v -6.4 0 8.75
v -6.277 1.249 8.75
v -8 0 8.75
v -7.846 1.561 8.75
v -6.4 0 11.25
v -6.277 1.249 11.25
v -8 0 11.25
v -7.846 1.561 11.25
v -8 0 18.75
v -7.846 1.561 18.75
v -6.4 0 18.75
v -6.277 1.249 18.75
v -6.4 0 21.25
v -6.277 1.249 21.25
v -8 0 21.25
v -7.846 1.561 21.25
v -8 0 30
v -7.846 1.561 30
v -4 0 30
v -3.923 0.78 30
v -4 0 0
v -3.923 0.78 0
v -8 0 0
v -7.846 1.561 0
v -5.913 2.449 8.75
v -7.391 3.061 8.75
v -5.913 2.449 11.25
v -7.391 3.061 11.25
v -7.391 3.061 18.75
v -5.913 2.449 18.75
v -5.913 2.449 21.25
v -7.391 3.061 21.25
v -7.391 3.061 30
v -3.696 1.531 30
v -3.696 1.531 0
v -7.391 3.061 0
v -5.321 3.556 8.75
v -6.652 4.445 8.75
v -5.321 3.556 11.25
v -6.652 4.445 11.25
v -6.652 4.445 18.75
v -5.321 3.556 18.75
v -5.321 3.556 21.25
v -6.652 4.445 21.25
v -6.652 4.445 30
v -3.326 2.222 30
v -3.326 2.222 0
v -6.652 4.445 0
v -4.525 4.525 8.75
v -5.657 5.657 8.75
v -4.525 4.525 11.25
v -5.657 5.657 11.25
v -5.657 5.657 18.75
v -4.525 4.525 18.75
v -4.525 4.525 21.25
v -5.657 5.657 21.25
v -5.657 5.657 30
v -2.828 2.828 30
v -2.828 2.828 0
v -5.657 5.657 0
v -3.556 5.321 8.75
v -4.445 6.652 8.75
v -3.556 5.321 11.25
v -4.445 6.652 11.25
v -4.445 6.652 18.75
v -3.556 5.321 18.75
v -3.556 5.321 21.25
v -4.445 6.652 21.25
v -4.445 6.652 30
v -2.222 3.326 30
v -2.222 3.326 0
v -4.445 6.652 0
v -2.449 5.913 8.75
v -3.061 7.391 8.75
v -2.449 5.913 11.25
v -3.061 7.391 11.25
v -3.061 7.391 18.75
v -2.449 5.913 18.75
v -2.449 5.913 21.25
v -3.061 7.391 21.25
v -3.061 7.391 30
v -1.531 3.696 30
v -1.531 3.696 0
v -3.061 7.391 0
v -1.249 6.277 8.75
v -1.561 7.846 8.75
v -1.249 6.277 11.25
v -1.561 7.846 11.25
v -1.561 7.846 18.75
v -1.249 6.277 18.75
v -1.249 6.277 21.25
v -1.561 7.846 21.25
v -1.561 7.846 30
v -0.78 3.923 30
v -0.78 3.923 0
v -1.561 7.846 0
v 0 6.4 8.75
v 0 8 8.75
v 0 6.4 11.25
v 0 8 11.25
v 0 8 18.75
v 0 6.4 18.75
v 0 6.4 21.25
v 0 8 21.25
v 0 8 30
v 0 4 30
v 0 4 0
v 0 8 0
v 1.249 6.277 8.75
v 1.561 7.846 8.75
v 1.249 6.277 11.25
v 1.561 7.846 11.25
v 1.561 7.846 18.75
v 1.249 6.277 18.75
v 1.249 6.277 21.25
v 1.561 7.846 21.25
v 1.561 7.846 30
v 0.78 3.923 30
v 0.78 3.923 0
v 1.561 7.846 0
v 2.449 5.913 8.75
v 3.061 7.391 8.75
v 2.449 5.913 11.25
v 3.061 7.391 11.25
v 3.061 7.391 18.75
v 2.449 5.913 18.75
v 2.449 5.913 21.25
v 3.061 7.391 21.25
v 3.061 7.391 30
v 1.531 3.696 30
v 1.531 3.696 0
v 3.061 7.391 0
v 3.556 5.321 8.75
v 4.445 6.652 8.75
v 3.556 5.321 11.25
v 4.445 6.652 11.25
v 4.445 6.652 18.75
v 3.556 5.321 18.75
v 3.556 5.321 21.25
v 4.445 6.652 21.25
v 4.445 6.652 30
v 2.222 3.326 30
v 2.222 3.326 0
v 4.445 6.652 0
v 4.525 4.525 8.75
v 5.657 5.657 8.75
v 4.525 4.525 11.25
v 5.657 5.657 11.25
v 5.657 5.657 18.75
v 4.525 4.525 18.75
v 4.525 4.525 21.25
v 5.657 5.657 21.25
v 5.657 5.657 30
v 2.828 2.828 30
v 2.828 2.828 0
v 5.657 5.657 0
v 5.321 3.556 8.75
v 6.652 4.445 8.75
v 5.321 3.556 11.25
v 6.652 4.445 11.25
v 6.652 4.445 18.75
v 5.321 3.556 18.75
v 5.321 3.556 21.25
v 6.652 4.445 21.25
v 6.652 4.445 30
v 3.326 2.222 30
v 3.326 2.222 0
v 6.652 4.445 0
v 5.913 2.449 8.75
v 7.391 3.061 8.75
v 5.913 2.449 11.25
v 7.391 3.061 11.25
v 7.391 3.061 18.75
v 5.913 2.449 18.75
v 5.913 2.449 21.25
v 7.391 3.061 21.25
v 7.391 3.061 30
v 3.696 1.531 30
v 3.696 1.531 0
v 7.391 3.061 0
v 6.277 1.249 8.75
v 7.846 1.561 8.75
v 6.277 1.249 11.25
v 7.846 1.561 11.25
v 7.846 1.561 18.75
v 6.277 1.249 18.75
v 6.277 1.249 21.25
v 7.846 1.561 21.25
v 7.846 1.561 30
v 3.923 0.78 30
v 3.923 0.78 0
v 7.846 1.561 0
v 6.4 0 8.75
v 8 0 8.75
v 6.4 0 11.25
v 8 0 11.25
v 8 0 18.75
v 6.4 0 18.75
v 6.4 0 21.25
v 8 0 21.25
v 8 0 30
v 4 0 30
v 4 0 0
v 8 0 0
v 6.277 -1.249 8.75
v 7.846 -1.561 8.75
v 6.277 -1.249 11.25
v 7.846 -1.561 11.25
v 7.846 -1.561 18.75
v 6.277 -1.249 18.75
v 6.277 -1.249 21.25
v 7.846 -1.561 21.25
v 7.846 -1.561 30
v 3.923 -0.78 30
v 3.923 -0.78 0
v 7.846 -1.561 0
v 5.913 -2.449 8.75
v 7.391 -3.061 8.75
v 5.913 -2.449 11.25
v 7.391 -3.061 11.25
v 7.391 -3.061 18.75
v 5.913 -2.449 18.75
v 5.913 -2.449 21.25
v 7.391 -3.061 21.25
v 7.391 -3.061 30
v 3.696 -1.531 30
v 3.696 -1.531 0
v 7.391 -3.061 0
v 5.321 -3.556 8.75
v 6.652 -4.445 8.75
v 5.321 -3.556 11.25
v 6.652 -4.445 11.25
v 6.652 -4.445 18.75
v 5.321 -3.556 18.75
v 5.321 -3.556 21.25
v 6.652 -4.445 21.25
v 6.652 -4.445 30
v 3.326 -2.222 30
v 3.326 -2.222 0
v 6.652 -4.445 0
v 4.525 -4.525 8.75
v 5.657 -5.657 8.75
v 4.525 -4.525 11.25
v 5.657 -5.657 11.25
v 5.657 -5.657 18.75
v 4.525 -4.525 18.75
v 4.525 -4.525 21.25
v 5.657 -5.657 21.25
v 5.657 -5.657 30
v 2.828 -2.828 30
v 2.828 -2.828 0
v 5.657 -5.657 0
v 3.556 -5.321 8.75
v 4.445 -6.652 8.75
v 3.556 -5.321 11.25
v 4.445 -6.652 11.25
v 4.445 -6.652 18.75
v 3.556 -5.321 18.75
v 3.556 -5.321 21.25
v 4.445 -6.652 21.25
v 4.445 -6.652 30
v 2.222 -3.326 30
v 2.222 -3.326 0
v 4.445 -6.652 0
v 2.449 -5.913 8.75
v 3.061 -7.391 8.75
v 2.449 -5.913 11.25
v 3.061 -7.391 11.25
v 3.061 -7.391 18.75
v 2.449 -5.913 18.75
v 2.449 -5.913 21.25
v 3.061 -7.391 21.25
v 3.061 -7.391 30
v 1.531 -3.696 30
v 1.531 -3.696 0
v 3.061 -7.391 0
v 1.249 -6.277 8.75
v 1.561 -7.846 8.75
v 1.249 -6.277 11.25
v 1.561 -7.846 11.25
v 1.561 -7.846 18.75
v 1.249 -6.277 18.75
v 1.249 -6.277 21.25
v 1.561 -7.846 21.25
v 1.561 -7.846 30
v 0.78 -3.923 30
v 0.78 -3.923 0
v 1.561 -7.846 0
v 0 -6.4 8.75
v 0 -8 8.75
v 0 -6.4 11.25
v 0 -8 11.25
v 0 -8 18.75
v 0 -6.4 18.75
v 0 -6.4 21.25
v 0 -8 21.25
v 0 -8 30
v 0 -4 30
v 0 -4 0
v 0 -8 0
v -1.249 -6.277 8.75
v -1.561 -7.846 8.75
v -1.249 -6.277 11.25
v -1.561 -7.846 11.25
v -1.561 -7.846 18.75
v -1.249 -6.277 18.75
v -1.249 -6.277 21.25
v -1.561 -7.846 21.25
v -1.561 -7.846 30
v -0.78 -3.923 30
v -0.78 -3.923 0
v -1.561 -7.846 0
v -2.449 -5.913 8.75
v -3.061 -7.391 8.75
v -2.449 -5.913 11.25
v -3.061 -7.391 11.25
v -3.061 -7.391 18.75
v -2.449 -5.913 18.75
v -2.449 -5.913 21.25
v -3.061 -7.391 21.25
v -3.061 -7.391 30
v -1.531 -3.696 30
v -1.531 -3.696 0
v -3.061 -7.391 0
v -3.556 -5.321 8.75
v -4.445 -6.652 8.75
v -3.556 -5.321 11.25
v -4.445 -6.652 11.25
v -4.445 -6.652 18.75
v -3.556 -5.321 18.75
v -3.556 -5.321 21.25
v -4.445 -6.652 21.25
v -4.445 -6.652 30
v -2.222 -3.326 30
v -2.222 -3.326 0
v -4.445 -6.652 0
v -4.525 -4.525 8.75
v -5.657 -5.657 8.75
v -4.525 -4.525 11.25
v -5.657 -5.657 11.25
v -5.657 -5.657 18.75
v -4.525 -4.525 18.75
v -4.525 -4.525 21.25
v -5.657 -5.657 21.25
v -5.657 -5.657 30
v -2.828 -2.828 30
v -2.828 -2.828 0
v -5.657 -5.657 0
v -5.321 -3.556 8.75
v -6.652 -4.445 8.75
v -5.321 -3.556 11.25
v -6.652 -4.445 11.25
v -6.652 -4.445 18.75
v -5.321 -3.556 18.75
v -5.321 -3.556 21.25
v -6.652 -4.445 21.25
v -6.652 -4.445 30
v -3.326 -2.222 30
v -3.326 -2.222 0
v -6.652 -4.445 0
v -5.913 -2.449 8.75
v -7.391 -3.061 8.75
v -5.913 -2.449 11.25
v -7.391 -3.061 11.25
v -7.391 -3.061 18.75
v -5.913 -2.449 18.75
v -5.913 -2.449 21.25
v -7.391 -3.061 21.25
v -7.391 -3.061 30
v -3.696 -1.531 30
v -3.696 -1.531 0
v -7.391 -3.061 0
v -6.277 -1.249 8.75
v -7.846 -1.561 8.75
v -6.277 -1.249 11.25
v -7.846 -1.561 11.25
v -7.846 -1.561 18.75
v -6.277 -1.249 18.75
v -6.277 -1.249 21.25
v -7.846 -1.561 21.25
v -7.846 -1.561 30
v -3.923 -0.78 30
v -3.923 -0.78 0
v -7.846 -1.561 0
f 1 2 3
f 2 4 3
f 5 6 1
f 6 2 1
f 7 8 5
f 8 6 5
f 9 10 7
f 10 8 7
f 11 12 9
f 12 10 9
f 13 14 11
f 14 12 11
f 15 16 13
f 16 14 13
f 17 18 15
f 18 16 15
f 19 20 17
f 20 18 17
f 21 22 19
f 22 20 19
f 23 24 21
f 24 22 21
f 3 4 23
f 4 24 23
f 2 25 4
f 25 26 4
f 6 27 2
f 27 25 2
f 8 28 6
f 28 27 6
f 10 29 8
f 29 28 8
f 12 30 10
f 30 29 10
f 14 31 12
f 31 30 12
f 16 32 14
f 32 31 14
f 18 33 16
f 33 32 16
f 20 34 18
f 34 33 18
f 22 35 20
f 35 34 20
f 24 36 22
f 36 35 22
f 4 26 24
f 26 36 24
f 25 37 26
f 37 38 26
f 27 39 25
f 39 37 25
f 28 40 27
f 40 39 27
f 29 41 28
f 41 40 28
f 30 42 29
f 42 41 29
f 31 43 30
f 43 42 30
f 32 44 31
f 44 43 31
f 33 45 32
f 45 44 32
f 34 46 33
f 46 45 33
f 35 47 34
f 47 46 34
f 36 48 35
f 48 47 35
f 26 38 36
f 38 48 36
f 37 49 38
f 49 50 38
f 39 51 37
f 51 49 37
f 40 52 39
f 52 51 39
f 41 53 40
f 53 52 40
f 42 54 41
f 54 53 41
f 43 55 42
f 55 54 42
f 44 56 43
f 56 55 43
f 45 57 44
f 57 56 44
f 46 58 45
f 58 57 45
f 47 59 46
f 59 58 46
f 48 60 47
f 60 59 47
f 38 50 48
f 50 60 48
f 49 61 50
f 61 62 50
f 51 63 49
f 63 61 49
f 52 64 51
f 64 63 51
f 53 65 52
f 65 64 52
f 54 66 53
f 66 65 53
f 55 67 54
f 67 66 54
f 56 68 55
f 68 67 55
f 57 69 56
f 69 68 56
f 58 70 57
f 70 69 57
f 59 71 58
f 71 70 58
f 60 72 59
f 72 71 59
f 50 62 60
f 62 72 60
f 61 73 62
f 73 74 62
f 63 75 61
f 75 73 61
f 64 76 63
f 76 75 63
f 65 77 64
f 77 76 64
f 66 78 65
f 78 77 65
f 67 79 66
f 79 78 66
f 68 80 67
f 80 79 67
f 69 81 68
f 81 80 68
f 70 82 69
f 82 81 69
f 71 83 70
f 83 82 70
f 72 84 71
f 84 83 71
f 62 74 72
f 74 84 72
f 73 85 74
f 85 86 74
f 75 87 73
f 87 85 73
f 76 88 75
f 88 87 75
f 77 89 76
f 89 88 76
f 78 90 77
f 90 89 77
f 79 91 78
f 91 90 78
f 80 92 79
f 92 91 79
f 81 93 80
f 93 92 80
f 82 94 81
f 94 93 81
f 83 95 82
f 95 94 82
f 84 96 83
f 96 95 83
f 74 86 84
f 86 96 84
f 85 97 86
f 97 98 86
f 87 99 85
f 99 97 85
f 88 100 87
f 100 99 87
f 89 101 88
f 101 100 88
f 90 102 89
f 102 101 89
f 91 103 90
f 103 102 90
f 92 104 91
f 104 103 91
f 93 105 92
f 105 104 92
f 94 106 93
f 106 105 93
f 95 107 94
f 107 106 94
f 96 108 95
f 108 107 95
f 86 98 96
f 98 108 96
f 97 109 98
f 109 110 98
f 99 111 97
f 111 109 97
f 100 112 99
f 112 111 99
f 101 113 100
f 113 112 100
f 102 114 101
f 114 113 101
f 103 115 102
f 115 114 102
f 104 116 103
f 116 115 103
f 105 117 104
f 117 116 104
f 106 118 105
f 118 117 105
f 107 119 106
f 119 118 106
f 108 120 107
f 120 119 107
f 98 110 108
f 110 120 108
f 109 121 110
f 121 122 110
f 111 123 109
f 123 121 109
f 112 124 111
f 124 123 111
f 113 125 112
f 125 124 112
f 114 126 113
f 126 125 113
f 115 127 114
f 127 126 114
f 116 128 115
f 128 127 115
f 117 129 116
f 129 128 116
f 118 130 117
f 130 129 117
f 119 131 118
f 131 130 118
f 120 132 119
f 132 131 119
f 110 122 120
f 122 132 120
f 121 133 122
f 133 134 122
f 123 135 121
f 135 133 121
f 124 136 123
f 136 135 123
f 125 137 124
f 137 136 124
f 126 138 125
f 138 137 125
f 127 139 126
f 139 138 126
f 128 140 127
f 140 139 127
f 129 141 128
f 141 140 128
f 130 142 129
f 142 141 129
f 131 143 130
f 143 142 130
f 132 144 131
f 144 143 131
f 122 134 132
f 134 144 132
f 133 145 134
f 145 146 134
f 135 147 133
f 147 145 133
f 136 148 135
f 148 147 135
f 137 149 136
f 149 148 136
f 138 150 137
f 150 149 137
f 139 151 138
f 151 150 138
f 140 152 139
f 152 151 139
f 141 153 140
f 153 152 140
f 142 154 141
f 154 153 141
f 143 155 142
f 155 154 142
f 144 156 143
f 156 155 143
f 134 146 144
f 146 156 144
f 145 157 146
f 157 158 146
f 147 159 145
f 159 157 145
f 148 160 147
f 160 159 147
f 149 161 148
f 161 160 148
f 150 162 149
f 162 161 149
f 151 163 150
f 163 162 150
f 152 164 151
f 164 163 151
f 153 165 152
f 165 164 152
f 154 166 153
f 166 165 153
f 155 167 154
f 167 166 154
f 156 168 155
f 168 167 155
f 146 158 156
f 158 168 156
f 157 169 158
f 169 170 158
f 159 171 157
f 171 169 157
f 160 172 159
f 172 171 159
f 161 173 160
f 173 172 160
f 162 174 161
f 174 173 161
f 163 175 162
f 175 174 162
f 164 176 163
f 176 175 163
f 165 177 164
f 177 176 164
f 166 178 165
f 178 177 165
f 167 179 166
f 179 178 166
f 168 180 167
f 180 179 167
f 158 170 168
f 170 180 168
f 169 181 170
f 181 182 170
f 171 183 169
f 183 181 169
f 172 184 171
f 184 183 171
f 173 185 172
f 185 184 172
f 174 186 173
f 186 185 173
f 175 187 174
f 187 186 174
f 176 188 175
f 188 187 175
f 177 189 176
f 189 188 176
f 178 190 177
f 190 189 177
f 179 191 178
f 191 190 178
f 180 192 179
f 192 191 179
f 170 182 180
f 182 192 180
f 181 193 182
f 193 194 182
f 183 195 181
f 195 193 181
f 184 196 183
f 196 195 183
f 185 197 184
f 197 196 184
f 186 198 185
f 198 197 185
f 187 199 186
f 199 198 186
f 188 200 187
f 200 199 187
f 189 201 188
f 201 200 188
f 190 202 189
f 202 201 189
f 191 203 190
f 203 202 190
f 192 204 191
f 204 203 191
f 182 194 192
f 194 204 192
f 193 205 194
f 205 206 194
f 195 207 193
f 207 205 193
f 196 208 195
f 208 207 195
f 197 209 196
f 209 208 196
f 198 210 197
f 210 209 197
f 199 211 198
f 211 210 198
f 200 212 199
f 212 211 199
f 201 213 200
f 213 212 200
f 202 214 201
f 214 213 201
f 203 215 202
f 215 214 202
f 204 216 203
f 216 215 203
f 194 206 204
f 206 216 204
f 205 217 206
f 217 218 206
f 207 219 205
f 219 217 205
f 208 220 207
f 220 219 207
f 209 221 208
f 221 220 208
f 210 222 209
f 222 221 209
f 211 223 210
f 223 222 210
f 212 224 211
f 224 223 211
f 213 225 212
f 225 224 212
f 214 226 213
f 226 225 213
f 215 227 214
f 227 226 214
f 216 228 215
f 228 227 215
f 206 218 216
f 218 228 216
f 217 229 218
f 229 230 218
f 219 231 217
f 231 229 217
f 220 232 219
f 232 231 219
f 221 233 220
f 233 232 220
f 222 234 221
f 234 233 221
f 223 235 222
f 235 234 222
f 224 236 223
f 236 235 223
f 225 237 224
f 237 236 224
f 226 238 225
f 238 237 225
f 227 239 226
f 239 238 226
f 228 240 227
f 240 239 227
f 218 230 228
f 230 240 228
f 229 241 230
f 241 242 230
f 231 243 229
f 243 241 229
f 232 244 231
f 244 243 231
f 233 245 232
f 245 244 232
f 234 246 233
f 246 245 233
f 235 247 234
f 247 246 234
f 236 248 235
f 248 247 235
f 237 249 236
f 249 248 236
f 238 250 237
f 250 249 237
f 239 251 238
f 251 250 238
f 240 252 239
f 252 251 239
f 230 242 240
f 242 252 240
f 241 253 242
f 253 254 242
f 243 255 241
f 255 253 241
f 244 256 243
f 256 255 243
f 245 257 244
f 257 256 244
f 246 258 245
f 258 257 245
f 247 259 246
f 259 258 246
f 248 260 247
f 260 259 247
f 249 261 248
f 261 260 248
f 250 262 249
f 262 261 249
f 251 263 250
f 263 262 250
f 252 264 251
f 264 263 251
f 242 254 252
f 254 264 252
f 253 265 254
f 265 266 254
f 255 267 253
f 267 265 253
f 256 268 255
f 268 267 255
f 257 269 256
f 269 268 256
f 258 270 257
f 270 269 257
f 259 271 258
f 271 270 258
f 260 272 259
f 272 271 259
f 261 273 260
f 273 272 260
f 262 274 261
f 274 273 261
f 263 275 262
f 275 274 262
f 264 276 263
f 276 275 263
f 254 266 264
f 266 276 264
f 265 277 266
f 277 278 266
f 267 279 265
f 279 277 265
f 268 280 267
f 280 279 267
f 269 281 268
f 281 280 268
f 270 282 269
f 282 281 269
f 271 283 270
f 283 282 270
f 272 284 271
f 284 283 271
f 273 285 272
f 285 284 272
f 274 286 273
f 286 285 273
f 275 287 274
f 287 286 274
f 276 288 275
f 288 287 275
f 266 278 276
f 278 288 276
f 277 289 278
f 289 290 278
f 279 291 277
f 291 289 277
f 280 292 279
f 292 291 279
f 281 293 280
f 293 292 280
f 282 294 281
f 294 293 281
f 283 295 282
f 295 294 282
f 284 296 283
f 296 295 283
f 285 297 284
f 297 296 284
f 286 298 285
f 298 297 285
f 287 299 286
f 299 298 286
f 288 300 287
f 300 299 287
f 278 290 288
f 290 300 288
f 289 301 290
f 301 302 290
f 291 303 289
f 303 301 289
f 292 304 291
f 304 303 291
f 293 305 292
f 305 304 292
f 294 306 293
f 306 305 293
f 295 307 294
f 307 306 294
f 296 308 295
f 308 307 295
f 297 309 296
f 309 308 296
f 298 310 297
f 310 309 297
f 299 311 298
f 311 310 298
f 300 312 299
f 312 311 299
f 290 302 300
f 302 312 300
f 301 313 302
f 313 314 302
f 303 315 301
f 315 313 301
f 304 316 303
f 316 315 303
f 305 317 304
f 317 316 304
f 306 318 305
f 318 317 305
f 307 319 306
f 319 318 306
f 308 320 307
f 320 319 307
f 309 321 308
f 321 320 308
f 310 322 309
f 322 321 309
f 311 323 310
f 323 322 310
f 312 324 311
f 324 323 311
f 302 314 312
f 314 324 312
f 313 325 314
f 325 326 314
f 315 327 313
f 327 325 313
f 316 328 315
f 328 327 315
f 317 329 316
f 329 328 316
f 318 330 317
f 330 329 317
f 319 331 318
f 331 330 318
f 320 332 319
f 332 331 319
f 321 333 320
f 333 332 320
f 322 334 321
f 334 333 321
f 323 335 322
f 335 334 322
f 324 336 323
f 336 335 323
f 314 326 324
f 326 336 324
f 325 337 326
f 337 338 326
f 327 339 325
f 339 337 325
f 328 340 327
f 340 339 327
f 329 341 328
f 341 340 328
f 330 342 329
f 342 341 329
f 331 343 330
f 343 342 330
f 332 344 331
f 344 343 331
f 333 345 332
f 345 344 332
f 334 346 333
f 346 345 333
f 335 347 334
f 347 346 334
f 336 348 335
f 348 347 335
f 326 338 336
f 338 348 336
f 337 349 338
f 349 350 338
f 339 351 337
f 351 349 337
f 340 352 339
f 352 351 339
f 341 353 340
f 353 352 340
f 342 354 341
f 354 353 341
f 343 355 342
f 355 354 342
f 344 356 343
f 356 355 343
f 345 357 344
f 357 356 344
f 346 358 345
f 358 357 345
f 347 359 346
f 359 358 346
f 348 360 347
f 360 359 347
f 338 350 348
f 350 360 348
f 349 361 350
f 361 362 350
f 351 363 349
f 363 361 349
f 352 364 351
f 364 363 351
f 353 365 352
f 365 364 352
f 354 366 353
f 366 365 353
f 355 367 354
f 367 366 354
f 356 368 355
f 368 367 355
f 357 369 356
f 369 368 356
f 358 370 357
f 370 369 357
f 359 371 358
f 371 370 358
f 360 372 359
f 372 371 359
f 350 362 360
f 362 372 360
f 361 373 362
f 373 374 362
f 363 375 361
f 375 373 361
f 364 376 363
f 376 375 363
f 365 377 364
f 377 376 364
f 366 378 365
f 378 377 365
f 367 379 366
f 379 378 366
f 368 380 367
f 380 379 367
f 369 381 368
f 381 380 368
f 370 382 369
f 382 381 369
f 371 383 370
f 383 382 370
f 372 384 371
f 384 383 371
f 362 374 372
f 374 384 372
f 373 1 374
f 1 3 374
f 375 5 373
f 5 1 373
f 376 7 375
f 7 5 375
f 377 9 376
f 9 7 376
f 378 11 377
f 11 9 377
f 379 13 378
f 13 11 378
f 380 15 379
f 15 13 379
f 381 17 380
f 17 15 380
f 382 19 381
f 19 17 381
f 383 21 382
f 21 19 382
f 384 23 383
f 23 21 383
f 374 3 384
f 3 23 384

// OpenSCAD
$fn = 32;

// ----------------------------------------------------------------------
// Grooved revolve: stepped, bore R4
// ----------------------------------------------------------------------

// --- parameters (mm) ---
bore_r = 4;               // bore radius
outer_r = 8;              // outer radius of the body
total_h = 30;             // overall height, Z
wall = 4;                 // radial wall thickness
groove_w = 2.5;           // groove width
groove_d = 1.6;           // groove depth
grooves = 2;              // number of outer grooves
fit_tol = 0.05;           // declared fit tolerance (prompt contract)
free_tol = 0.3;           // declared free tolerance (prompt contract)

bbox_x = 2 * outer_r;  // full diameter
bore_d = 2 * bore_r;  // bore diameter
body_d = 2 * outer_r;  // body diameter
revolve_angle = 360;  // full turn around the Z axis

profile = [[4, 0], [8, 0], [8, 8.75], [6.4, 8.75], [6.4, 11.25], [8, 11.25], [8, 18.75], [6.4, 18.75], [6.4, 21.25], [8, 21.25], [8, 30], [4, 30]];  // primary outline, 12 points, counter clockwise

// --- the one profile operation ---
rotate_extrude(angle = revolve_angle) polygon(points = profile);
